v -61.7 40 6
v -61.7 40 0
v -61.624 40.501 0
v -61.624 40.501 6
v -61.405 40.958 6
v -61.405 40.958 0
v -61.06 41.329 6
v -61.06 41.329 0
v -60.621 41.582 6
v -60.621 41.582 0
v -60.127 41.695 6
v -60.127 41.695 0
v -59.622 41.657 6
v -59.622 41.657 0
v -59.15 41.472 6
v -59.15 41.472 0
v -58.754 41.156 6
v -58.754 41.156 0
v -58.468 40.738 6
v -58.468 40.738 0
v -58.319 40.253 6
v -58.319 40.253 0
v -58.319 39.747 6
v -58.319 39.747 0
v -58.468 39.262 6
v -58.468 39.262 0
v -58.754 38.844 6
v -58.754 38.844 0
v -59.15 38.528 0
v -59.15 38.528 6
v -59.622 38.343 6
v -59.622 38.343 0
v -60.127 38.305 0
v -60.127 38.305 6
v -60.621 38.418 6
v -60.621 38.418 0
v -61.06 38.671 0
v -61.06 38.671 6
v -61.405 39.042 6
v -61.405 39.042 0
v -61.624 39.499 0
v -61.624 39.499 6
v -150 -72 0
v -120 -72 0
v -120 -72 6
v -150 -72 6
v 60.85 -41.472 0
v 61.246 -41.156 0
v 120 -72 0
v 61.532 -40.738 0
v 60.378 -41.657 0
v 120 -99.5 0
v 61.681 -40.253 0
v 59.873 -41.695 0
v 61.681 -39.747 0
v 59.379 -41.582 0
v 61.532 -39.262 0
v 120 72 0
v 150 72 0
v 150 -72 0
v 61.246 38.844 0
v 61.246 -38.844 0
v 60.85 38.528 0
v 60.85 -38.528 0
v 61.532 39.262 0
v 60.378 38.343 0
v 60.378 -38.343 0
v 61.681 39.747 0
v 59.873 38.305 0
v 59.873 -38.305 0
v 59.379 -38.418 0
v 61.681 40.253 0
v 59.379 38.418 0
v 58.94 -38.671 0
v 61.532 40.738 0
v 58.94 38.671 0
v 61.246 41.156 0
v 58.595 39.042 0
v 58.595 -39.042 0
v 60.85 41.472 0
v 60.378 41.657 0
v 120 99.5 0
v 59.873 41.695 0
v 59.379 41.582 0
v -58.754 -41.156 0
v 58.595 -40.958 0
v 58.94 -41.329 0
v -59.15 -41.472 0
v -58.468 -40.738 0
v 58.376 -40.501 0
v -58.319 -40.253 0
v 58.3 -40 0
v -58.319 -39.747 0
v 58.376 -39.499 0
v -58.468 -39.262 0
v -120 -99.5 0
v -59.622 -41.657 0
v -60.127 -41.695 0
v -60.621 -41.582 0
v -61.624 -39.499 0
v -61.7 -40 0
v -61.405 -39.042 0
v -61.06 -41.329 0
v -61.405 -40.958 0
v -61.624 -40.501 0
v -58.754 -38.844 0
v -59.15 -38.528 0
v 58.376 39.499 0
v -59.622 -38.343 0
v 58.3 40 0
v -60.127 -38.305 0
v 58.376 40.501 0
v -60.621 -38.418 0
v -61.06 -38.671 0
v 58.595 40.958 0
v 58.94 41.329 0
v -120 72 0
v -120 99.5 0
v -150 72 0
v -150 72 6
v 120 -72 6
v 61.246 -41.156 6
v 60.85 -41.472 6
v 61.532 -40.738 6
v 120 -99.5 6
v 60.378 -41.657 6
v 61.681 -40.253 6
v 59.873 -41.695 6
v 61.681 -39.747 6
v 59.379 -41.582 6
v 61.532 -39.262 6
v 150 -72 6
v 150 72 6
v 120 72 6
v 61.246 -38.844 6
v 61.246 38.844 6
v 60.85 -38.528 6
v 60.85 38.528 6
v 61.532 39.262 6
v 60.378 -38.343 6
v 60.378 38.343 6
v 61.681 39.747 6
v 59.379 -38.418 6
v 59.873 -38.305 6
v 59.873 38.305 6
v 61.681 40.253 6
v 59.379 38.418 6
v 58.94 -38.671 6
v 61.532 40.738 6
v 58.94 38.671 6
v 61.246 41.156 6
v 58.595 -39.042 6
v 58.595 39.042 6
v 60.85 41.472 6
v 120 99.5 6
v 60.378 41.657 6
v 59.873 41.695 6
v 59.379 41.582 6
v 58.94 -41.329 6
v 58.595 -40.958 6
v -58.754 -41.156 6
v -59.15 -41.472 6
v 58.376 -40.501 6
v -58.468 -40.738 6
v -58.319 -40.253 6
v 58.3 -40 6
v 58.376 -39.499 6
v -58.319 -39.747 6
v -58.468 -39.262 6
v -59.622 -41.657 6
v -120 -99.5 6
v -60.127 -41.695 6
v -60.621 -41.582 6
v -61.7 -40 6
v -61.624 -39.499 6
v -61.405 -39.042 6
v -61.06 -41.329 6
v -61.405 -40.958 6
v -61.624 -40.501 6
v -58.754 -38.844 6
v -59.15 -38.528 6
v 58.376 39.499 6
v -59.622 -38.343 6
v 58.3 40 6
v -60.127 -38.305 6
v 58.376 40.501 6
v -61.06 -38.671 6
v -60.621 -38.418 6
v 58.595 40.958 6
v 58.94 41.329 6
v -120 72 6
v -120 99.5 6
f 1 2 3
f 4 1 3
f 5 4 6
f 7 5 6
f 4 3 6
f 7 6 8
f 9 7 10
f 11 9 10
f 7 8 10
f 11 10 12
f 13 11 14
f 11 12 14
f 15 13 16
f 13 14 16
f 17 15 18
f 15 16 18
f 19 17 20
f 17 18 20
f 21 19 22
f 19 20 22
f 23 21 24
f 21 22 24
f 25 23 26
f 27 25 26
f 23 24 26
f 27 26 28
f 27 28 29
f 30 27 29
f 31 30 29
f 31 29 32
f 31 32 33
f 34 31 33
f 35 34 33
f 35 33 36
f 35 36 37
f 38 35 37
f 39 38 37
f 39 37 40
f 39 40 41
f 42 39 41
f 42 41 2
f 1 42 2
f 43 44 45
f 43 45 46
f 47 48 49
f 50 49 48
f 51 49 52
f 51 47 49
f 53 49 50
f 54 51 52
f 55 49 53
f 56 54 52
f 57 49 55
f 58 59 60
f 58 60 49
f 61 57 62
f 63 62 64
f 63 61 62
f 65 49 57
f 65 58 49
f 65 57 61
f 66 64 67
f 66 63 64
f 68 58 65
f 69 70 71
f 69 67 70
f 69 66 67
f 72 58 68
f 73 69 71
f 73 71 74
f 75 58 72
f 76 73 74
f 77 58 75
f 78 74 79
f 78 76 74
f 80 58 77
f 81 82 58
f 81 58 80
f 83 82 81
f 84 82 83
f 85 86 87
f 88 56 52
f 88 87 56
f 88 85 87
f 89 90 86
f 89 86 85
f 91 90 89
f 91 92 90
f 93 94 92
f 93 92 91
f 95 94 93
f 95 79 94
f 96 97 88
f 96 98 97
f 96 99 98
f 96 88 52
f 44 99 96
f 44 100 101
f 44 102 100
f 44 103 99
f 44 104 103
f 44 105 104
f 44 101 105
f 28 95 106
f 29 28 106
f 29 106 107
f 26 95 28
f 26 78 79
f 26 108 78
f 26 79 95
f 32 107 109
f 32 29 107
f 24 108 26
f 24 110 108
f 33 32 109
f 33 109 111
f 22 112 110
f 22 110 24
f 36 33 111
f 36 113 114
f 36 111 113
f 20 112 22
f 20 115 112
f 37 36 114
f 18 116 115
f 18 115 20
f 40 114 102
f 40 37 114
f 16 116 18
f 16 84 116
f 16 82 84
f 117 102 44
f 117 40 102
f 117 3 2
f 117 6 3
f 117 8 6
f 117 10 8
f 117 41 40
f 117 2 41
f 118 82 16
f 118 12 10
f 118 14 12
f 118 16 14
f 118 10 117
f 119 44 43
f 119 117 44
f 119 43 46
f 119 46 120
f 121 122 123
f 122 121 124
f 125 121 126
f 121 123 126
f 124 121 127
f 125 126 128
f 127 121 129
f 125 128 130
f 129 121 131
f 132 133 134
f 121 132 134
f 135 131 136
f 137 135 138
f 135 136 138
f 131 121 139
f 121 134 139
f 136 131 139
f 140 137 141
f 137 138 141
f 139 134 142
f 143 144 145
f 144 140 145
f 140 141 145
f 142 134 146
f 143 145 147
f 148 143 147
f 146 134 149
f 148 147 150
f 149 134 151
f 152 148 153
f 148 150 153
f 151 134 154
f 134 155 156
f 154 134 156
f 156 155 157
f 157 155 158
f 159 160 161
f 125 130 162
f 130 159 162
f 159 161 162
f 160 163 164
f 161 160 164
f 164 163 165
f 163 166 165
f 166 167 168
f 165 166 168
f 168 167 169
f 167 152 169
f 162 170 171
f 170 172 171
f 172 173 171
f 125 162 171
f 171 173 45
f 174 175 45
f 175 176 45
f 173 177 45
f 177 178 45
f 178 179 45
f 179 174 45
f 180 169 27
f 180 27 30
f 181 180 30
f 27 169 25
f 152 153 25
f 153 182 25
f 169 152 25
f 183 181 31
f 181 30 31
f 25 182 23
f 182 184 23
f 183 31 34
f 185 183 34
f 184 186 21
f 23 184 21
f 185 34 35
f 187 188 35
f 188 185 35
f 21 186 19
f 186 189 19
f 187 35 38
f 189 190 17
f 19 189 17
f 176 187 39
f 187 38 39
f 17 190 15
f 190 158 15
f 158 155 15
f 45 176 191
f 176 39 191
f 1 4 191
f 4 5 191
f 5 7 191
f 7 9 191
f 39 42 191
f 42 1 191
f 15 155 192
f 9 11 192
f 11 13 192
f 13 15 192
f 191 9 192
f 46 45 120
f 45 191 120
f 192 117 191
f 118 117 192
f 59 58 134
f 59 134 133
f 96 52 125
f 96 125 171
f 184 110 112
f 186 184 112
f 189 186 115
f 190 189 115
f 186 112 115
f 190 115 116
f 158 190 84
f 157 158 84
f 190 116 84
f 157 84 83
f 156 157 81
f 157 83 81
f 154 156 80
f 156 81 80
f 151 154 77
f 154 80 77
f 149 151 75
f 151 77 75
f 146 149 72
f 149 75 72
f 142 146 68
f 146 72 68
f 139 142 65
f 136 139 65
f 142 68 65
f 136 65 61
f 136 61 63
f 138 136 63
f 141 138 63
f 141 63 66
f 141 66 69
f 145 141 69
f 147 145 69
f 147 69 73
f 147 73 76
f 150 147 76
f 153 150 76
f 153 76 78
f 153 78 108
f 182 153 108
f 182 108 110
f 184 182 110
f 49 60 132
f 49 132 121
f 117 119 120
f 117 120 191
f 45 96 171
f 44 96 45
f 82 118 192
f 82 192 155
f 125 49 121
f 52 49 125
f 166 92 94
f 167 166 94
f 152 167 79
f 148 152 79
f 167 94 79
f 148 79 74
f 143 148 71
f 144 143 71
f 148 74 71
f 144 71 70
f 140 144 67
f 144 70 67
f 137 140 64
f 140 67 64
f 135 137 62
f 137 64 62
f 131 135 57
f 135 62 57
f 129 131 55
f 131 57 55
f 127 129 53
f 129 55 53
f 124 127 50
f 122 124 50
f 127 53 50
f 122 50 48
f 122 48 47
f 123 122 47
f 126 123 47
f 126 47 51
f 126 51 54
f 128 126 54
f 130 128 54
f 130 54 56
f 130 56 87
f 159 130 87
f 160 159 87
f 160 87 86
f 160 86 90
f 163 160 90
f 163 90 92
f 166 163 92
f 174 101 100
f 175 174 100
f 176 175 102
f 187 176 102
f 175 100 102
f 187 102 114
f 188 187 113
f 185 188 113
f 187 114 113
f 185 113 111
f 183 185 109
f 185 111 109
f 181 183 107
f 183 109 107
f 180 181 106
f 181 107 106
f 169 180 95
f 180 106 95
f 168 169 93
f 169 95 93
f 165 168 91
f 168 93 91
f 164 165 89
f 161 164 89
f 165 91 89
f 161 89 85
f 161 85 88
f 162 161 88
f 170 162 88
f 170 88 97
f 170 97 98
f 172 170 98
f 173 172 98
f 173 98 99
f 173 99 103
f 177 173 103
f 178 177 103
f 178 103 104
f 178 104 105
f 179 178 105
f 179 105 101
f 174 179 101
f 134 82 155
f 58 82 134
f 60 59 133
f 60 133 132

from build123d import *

# Parameters (mm, degrees)
BOSS_EXTRUDE1_DEPTH  = 6
M3_CLEARANCE_HOLE1_D = 3.4


with BuildPart() as part:
    # Sketch1 → Boss-Extrude1 (new body)
    with BuildSketch(Plane.XY):
        Polygon((120, 72), (150, 72), (150, -72), (120, -72), (120, -99.5), (-120, -99.5), (-120, -72), (-150, -72), (-150, 72), (-120, 72), (-120, 99.5), (120, 99.5), align=None)
    extrude(amount=BOSS_EXTRUDE1_DEPTH)

    # M3 Clearance Hole1 (through all)
    with Locations(Plane(origin=(-60, 40, 6), x_dir=(1, 0, 0), z_dir=(0, 0, 1))):
        with Locations((0, 0), (0, -80), (120, -80), (120, 0)):
            Hole(M3_CLEARANCE_HOLE1_D / 2)


solid = part.part
